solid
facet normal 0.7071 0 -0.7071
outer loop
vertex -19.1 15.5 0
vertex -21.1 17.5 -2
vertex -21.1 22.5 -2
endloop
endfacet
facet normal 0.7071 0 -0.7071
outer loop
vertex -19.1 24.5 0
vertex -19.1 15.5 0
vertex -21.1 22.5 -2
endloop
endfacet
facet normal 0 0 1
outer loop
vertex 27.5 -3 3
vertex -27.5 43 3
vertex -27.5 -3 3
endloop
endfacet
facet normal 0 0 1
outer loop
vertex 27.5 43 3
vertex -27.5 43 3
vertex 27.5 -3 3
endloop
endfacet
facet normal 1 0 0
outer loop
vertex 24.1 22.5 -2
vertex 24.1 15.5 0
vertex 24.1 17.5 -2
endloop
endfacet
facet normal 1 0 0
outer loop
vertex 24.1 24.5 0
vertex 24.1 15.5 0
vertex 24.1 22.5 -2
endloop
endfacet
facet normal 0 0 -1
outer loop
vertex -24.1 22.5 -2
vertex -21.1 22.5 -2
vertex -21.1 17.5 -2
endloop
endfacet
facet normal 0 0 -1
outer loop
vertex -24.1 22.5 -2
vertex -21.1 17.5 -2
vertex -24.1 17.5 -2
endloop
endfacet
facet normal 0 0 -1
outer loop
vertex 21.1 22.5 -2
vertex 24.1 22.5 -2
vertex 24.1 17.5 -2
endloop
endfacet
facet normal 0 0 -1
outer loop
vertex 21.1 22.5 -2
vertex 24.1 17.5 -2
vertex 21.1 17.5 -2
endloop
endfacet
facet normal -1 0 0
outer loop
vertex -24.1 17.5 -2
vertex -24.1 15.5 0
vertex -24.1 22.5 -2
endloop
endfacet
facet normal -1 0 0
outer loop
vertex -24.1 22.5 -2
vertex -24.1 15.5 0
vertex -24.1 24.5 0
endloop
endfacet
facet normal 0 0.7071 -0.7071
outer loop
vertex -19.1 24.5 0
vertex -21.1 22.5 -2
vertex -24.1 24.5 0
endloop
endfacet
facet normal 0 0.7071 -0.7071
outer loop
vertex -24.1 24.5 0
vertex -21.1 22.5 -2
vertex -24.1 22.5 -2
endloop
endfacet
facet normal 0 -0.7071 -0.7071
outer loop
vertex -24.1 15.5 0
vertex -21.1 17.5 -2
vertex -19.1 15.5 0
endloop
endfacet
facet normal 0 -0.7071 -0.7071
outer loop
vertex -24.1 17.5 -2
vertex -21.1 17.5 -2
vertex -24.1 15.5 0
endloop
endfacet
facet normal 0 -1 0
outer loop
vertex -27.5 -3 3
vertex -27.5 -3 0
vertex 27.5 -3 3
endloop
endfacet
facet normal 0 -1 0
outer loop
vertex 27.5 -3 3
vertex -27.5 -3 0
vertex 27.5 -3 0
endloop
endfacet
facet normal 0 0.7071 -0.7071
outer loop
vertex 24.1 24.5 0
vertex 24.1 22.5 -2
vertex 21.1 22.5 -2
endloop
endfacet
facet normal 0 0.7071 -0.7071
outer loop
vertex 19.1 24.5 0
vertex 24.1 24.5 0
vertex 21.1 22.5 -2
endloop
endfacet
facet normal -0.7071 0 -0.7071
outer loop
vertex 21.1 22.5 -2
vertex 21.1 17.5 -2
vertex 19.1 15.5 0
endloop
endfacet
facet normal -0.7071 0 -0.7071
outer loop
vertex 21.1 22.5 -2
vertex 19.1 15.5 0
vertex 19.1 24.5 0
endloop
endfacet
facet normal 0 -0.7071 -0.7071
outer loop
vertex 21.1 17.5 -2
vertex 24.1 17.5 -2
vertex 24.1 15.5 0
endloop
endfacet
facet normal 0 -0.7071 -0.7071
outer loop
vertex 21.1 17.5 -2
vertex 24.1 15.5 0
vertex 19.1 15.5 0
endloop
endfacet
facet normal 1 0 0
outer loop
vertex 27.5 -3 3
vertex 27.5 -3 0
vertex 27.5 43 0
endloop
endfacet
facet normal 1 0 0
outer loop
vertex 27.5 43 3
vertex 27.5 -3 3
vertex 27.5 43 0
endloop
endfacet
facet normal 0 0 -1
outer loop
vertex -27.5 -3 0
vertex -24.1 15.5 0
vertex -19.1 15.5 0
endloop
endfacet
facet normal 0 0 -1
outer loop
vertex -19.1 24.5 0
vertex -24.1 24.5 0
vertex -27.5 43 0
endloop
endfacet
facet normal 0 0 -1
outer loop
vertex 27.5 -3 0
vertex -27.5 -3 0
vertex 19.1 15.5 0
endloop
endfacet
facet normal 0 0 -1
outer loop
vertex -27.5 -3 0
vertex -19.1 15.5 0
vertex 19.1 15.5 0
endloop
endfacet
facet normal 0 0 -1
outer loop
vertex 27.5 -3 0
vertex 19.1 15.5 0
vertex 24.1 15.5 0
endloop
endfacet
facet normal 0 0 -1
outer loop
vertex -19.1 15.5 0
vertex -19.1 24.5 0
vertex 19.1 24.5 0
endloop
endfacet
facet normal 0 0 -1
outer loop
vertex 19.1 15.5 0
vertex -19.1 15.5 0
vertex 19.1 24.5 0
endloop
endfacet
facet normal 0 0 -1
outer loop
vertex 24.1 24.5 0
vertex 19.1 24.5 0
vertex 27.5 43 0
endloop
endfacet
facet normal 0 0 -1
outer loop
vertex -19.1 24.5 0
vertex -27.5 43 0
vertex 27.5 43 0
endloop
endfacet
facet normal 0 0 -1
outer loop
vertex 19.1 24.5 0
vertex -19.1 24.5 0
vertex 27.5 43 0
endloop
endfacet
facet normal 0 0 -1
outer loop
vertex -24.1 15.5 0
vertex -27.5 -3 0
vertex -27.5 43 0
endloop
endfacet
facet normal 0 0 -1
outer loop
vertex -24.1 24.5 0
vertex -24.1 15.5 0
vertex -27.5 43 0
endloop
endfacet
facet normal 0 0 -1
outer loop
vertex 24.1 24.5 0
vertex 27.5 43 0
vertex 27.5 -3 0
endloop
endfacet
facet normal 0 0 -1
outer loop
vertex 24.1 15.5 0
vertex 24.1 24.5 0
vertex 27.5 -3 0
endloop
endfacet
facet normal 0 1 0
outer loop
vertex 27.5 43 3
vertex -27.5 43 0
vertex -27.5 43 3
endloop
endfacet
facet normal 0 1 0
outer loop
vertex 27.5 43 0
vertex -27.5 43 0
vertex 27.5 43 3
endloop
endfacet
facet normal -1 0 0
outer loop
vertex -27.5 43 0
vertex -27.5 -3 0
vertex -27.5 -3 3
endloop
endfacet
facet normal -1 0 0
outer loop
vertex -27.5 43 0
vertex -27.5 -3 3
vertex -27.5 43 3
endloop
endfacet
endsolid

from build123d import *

# Parameters (mm, degrees)
SKETCH_1_W      = 55
SKETCH_1_H      = 46
EXTRUDE_1_DEPTH = 3
SKETCH_2_W      = 3
SKETCH_2_H      = 5
EXTRUDE_2_DEPTH = 2
CHAMFER_1_SIZE  = 2


with BuildPart() as part:
    # Эскиз1 → Бобышка-Вытянуть1 (new body)
    with BuildSketch(Plane.XY):
        with Locations((0, 20)):
            Rectangle(SKETCH_1_W, SKETCH_1_H)
    extrude(amount=EXTRUDE_1_DEPTH)

    # Эскиз2 → Бобышка-Вытянуть2 (add)
    with BuildSketch(Plane(origin=(0, 0, 0), x_dir=(-1, 0, 0), z_dir=(0, 0, -1))):
        with Locations((-22.6, 20)):
            Rectangle(SKETCH_2_W, SKETCH_2_H)
        with Locations((22.6, 20)):
            Rectangle(SKETCH_2_W, SKETCH_2_H)
    extrude(amount=EXTRUDE_2_DEPTH)

    # Фаска1
    chamfer_1_edges = [part.edges().sort_by_distance(p)[0] for p in [
        (-22.6, 17.5, 0),
        (-21.1, 20, 0),
        (-22.6, 22.5, 0),
        (22.6, 22.5, 0),
        (21.1, 20, 0),
        (22.6, 17.5, 0),
    ]]
    chamfer(chamfer_1_edges, length=CHAMFER_1_SIZE - 0.0001)  # a hair under: the kernel refuses the full size


solid = part.part
